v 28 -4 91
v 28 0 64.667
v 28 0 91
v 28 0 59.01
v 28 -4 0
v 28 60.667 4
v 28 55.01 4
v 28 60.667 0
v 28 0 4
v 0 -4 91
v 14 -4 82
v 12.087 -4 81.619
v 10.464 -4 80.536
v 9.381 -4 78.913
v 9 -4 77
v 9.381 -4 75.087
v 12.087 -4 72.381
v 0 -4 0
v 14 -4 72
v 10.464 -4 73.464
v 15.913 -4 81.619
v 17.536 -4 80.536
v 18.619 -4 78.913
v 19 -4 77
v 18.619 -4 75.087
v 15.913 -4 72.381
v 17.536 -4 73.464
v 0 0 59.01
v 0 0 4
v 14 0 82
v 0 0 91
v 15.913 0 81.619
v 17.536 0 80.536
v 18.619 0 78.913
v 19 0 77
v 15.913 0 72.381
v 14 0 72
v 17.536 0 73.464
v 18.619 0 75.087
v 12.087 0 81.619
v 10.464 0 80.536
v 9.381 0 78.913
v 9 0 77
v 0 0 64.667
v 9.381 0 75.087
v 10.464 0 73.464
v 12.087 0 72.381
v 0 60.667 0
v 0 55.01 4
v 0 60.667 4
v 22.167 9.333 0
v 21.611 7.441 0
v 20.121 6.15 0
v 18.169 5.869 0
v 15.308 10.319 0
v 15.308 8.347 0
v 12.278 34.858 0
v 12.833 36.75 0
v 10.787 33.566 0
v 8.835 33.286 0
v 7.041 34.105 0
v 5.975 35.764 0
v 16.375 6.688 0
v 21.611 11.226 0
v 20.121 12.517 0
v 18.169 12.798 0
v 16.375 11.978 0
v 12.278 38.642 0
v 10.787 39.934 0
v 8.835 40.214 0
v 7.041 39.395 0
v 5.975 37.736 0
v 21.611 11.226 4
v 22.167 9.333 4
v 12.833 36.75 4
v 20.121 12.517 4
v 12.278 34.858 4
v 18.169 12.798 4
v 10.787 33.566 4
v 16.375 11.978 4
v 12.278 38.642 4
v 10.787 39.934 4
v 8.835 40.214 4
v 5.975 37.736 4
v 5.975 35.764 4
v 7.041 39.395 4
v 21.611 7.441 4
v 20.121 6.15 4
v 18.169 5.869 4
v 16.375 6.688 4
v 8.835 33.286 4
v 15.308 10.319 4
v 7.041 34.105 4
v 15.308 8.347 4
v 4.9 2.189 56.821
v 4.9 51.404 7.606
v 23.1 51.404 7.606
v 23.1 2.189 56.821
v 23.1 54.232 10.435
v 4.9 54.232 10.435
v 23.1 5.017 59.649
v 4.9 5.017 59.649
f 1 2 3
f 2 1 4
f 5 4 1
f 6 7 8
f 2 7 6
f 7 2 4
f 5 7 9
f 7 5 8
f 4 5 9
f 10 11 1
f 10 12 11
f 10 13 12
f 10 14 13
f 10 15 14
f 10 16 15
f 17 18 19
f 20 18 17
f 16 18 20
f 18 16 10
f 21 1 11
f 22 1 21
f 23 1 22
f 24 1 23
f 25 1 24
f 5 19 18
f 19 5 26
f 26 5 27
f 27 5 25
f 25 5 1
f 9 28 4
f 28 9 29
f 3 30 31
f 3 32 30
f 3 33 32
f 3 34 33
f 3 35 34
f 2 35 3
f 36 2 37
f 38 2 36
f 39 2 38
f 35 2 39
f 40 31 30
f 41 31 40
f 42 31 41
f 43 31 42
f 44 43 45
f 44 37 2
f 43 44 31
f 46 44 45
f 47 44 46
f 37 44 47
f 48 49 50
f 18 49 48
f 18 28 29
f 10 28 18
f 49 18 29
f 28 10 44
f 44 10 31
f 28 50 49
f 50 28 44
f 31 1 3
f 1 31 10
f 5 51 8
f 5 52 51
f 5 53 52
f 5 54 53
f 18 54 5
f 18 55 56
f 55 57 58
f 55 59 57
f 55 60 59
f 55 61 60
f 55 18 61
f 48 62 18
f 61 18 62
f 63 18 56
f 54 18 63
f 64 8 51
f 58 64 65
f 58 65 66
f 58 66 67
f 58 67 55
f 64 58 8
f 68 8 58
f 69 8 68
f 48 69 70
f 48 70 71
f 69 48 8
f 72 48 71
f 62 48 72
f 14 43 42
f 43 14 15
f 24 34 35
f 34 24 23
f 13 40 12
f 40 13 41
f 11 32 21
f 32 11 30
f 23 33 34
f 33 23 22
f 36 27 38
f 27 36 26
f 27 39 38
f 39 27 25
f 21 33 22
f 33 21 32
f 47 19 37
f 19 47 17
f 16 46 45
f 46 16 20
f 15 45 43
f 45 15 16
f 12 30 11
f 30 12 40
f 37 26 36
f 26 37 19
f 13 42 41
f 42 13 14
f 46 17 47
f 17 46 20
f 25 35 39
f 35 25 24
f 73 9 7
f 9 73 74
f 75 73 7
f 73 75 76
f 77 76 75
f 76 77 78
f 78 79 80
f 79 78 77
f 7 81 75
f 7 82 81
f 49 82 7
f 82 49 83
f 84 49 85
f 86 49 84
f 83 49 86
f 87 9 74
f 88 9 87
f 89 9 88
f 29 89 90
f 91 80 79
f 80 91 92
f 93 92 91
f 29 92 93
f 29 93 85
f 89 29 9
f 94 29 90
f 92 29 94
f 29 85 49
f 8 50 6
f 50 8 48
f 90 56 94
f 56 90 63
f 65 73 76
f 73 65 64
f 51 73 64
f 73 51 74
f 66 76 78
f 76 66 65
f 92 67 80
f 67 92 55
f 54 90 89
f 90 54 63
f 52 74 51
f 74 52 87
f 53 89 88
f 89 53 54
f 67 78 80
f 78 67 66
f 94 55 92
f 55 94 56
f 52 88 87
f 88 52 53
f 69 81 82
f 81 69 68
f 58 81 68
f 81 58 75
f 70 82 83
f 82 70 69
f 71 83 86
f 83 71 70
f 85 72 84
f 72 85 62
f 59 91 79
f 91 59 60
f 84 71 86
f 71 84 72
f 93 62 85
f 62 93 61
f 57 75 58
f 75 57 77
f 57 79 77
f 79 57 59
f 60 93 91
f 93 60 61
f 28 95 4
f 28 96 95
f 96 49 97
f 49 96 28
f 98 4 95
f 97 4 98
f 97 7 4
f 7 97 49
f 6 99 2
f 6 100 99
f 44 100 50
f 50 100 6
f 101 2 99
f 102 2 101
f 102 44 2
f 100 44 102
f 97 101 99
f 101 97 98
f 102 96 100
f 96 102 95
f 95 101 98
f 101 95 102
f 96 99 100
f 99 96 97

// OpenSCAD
adapter_height=91;
adapter_width=28;
adapter_length=adapter_height*2/3;
adapter_thickness=4;
wall_mount_screw_diameter=7;
wall_mount_screw_separation_x=adapter_width/3;
wall_mount_screw_separation_y=adapter_height/4;
kinect_mount_screw_diameter=10;
support_cutout_x=0.65; //percentage of width
support_cutout_y=0.8; //percentage of height
support_angle=45;
support_length=87;


adapter_combined();

module adapter_combined(){
rotate([90,0,0]){adapter_height();};
adapter_width();
translate([0,adapter_length,adapter_thickness])
rotate([90+support_angle,0,0]){adapter_support();};
}

module adapter_height(){
    difference(){
    cube([adapter_width,adapter_height,adapter_thickness]);
        translate([adapter_width/2,adapter_height-adapter_width/2,-0.1])
        cylinder(d=kinect_mount_screw_diameter,h=adapter_thickness+0.2);
    }
}

module adapter_width(){
    difference(){
    cube([adapter_width,adapter_length,adapter_thickness]);

//    translate([adapter_width/2-wall_mount_screw_separation_x/2,adapter_width/3,-0.1])
//        cylinder(d=wall_mount_screw_diameter,h=adapter_thickness+0.2);
    translate([adapter_width/2+wall_mount_screw_separation_x/2,adapter_width/3,-0.1])
        cylinder(d=wall_mount_screw_diameter,h=adapter_thickness+0.2);
        
//    translate([adapter_width/2-wall_mount_screw_separation_x/2,adapter_width/2-wall_mount_screw_separation_y,-0.1])
//        cylinder(d=wall_mount_screw_diameter,h=adapter_thickness+0.2);
    translate([adapter_width/2-wall_mount_screw_separation_x/2,adapter_width/2+wall_mount_screw_separation_y,-0.1])
        cylinder(d=wall_mount_screw_diameter,h=adapter_thickness+0.2);
    }
}

module adapter_support(){
    difference(){
    cube([adapter_width,support_length,adapter_thickness]);
        translate([(adapter_width-adapter_width*support_cutout_x)/2,(adapter_height-adapter_height*support_cutout_y)/2,-0.1])
    cube([adapter_width*support_cutout_x,support_length*support_cutout_y,adapter_thickness+0.2]);
    }
}
